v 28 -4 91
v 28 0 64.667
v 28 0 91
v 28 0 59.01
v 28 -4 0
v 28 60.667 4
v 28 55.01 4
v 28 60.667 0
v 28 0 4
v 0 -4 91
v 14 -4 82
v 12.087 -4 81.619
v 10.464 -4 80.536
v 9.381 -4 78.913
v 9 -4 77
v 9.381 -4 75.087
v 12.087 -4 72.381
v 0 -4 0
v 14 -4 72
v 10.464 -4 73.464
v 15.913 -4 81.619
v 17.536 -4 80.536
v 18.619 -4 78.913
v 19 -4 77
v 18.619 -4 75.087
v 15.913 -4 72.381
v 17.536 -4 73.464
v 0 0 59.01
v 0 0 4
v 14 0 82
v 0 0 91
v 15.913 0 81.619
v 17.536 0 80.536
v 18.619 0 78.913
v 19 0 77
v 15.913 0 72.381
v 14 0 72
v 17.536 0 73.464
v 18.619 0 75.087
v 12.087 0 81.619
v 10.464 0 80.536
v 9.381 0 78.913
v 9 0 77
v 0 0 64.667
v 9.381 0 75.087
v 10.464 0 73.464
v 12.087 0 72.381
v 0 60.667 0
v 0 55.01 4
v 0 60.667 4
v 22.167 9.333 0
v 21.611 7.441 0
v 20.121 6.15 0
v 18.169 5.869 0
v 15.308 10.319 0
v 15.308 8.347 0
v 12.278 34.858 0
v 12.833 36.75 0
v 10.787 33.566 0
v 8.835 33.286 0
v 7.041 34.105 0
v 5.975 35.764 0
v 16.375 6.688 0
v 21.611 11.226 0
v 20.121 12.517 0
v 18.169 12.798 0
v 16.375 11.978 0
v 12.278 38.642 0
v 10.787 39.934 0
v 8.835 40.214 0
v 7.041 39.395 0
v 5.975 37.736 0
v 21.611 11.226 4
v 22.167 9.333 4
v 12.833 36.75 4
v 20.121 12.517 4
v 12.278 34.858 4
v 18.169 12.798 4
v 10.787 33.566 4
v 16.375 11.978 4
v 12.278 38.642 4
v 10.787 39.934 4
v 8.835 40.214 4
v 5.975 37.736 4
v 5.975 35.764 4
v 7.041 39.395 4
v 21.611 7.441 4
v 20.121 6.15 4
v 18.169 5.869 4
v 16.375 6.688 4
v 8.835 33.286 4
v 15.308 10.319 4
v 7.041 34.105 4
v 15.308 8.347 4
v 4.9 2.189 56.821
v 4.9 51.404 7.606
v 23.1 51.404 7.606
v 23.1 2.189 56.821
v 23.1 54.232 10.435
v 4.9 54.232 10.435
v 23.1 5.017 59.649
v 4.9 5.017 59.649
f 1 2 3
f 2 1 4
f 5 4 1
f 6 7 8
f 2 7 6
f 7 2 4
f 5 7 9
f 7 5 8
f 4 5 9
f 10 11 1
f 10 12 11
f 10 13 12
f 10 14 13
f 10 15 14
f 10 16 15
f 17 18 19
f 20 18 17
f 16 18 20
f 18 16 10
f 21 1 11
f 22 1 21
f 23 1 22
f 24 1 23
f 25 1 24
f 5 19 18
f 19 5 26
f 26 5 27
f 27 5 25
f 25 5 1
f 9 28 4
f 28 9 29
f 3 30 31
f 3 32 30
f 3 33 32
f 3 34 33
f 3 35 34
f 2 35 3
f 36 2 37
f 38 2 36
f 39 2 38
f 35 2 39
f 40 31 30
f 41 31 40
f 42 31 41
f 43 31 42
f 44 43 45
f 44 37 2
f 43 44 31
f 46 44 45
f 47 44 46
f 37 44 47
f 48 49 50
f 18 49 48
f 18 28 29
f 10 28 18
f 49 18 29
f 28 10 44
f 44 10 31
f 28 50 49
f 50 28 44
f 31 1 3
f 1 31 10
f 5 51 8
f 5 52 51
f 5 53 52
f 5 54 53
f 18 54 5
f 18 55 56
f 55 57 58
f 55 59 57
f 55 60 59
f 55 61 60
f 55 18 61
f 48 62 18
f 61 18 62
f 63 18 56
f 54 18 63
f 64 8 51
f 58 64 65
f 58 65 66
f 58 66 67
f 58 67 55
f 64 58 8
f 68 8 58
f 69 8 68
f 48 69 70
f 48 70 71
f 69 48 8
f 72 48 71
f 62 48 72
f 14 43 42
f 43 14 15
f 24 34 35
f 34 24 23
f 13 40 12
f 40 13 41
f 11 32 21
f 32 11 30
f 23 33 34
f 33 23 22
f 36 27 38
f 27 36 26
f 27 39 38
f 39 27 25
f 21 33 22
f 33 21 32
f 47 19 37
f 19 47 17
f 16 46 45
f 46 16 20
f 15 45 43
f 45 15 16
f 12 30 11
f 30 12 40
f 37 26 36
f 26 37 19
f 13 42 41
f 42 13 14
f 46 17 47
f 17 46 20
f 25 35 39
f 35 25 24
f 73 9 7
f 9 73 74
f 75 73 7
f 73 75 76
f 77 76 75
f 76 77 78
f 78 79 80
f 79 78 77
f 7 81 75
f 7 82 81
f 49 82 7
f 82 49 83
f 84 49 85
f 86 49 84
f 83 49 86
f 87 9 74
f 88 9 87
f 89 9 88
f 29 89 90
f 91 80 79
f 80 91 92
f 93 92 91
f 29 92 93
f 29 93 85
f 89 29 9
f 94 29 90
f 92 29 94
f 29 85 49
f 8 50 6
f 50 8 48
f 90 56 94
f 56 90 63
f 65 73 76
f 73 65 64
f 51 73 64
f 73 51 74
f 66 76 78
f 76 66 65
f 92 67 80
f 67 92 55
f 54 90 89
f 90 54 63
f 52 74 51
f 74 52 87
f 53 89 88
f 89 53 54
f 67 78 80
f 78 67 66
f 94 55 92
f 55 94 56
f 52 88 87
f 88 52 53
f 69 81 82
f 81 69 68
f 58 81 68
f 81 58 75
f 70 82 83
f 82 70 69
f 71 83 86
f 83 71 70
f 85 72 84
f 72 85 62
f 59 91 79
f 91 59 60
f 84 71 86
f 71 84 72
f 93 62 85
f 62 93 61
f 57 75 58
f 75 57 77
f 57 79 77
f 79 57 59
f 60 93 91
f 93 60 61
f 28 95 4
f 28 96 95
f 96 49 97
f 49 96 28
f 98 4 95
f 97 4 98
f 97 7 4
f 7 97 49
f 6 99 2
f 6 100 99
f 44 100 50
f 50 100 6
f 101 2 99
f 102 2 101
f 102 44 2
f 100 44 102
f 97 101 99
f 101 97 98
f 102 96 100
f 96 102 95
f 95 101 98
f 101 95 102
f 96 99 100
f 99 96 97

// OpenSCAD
adapter_height=91;
adapter_width=28;
adapter_length=adapter_height*2/3;
adapter_thickness=4;
wall_mount_screw_diameter=7;
wall_mount_screw_separation_x=adapter_width/3;
wall_mount_screw_separation_y=adapter_height/4;
kinect_mount_screw_diameter=10;
support_cutout_x=0.65; //percentage of width
support_cutout_y=0.8; //percentage of height
support_angle=45;
support_length=87;


adapter_combined();

module adapter_combined(){
rotate([90,0,0]){adapter_height();};
adapter_width();
translate([0,adapter_length,adapter_thickness])
rotate([90+support_angle,0,0]){adapter_support();};
}

module adapter_height(){
    difference(){
    cube([adapter_width,adapter_height,adapter_thickness]);
        translate([adapter_width/2,adapter_height-adapter_width/2,-0.1])
        cylinder(d=kinect_mount_screw_diameter,h=adapter_thickness+0.2);
    }
}

module adapter_width(){
    difference(){
    cube([adapter_width,adapter_length,adapter_thickness]);

//    translate([adapter_width/2-wall_mount_screw_separation_x/2,adapter_width/3,-0.1])
//        cylinder(d=wall_mount_screw_diameter,h=adapter_thickness+0.2);
    translate([adapter_width/2+wall_mount_screw_separation_x/2,adapter_width/3,-0.1])
        cylinder(d=wall_mount_screw_diameter,h=adapter_thickness+0.2);
        
//    translate([adapter_width/2-wall_mount_screw_separation_x/2,adapter_width/2-wall_mount_screw_separation_y,-0.1])
//        cylinder(d=wall_mount_screw_diameter,h=adapter_thickness+0.2);
    translate([adapter_width/2-wall_mount_screw_separation_x/2,adapter_width/2+wall_mount_screw_separation_y,-0.1])
        cylinder(d=wall_mount_screw_diameter,h=adapter_thickness+0.2);
    }
}

module adapter_support(){
    difference(){
    cube([adapter_width,support_length,adapter_thickness]);
        translate([(adapter_width-adapter_width*support_cutout_x)/2,(adapter_height-adapter_height*support_cutout_y)/2,-0.1])
    cube([adapter_width*support_cutout_x,support_length*support_cutout_y,adapter_thickness+0.2]);
    }
}
